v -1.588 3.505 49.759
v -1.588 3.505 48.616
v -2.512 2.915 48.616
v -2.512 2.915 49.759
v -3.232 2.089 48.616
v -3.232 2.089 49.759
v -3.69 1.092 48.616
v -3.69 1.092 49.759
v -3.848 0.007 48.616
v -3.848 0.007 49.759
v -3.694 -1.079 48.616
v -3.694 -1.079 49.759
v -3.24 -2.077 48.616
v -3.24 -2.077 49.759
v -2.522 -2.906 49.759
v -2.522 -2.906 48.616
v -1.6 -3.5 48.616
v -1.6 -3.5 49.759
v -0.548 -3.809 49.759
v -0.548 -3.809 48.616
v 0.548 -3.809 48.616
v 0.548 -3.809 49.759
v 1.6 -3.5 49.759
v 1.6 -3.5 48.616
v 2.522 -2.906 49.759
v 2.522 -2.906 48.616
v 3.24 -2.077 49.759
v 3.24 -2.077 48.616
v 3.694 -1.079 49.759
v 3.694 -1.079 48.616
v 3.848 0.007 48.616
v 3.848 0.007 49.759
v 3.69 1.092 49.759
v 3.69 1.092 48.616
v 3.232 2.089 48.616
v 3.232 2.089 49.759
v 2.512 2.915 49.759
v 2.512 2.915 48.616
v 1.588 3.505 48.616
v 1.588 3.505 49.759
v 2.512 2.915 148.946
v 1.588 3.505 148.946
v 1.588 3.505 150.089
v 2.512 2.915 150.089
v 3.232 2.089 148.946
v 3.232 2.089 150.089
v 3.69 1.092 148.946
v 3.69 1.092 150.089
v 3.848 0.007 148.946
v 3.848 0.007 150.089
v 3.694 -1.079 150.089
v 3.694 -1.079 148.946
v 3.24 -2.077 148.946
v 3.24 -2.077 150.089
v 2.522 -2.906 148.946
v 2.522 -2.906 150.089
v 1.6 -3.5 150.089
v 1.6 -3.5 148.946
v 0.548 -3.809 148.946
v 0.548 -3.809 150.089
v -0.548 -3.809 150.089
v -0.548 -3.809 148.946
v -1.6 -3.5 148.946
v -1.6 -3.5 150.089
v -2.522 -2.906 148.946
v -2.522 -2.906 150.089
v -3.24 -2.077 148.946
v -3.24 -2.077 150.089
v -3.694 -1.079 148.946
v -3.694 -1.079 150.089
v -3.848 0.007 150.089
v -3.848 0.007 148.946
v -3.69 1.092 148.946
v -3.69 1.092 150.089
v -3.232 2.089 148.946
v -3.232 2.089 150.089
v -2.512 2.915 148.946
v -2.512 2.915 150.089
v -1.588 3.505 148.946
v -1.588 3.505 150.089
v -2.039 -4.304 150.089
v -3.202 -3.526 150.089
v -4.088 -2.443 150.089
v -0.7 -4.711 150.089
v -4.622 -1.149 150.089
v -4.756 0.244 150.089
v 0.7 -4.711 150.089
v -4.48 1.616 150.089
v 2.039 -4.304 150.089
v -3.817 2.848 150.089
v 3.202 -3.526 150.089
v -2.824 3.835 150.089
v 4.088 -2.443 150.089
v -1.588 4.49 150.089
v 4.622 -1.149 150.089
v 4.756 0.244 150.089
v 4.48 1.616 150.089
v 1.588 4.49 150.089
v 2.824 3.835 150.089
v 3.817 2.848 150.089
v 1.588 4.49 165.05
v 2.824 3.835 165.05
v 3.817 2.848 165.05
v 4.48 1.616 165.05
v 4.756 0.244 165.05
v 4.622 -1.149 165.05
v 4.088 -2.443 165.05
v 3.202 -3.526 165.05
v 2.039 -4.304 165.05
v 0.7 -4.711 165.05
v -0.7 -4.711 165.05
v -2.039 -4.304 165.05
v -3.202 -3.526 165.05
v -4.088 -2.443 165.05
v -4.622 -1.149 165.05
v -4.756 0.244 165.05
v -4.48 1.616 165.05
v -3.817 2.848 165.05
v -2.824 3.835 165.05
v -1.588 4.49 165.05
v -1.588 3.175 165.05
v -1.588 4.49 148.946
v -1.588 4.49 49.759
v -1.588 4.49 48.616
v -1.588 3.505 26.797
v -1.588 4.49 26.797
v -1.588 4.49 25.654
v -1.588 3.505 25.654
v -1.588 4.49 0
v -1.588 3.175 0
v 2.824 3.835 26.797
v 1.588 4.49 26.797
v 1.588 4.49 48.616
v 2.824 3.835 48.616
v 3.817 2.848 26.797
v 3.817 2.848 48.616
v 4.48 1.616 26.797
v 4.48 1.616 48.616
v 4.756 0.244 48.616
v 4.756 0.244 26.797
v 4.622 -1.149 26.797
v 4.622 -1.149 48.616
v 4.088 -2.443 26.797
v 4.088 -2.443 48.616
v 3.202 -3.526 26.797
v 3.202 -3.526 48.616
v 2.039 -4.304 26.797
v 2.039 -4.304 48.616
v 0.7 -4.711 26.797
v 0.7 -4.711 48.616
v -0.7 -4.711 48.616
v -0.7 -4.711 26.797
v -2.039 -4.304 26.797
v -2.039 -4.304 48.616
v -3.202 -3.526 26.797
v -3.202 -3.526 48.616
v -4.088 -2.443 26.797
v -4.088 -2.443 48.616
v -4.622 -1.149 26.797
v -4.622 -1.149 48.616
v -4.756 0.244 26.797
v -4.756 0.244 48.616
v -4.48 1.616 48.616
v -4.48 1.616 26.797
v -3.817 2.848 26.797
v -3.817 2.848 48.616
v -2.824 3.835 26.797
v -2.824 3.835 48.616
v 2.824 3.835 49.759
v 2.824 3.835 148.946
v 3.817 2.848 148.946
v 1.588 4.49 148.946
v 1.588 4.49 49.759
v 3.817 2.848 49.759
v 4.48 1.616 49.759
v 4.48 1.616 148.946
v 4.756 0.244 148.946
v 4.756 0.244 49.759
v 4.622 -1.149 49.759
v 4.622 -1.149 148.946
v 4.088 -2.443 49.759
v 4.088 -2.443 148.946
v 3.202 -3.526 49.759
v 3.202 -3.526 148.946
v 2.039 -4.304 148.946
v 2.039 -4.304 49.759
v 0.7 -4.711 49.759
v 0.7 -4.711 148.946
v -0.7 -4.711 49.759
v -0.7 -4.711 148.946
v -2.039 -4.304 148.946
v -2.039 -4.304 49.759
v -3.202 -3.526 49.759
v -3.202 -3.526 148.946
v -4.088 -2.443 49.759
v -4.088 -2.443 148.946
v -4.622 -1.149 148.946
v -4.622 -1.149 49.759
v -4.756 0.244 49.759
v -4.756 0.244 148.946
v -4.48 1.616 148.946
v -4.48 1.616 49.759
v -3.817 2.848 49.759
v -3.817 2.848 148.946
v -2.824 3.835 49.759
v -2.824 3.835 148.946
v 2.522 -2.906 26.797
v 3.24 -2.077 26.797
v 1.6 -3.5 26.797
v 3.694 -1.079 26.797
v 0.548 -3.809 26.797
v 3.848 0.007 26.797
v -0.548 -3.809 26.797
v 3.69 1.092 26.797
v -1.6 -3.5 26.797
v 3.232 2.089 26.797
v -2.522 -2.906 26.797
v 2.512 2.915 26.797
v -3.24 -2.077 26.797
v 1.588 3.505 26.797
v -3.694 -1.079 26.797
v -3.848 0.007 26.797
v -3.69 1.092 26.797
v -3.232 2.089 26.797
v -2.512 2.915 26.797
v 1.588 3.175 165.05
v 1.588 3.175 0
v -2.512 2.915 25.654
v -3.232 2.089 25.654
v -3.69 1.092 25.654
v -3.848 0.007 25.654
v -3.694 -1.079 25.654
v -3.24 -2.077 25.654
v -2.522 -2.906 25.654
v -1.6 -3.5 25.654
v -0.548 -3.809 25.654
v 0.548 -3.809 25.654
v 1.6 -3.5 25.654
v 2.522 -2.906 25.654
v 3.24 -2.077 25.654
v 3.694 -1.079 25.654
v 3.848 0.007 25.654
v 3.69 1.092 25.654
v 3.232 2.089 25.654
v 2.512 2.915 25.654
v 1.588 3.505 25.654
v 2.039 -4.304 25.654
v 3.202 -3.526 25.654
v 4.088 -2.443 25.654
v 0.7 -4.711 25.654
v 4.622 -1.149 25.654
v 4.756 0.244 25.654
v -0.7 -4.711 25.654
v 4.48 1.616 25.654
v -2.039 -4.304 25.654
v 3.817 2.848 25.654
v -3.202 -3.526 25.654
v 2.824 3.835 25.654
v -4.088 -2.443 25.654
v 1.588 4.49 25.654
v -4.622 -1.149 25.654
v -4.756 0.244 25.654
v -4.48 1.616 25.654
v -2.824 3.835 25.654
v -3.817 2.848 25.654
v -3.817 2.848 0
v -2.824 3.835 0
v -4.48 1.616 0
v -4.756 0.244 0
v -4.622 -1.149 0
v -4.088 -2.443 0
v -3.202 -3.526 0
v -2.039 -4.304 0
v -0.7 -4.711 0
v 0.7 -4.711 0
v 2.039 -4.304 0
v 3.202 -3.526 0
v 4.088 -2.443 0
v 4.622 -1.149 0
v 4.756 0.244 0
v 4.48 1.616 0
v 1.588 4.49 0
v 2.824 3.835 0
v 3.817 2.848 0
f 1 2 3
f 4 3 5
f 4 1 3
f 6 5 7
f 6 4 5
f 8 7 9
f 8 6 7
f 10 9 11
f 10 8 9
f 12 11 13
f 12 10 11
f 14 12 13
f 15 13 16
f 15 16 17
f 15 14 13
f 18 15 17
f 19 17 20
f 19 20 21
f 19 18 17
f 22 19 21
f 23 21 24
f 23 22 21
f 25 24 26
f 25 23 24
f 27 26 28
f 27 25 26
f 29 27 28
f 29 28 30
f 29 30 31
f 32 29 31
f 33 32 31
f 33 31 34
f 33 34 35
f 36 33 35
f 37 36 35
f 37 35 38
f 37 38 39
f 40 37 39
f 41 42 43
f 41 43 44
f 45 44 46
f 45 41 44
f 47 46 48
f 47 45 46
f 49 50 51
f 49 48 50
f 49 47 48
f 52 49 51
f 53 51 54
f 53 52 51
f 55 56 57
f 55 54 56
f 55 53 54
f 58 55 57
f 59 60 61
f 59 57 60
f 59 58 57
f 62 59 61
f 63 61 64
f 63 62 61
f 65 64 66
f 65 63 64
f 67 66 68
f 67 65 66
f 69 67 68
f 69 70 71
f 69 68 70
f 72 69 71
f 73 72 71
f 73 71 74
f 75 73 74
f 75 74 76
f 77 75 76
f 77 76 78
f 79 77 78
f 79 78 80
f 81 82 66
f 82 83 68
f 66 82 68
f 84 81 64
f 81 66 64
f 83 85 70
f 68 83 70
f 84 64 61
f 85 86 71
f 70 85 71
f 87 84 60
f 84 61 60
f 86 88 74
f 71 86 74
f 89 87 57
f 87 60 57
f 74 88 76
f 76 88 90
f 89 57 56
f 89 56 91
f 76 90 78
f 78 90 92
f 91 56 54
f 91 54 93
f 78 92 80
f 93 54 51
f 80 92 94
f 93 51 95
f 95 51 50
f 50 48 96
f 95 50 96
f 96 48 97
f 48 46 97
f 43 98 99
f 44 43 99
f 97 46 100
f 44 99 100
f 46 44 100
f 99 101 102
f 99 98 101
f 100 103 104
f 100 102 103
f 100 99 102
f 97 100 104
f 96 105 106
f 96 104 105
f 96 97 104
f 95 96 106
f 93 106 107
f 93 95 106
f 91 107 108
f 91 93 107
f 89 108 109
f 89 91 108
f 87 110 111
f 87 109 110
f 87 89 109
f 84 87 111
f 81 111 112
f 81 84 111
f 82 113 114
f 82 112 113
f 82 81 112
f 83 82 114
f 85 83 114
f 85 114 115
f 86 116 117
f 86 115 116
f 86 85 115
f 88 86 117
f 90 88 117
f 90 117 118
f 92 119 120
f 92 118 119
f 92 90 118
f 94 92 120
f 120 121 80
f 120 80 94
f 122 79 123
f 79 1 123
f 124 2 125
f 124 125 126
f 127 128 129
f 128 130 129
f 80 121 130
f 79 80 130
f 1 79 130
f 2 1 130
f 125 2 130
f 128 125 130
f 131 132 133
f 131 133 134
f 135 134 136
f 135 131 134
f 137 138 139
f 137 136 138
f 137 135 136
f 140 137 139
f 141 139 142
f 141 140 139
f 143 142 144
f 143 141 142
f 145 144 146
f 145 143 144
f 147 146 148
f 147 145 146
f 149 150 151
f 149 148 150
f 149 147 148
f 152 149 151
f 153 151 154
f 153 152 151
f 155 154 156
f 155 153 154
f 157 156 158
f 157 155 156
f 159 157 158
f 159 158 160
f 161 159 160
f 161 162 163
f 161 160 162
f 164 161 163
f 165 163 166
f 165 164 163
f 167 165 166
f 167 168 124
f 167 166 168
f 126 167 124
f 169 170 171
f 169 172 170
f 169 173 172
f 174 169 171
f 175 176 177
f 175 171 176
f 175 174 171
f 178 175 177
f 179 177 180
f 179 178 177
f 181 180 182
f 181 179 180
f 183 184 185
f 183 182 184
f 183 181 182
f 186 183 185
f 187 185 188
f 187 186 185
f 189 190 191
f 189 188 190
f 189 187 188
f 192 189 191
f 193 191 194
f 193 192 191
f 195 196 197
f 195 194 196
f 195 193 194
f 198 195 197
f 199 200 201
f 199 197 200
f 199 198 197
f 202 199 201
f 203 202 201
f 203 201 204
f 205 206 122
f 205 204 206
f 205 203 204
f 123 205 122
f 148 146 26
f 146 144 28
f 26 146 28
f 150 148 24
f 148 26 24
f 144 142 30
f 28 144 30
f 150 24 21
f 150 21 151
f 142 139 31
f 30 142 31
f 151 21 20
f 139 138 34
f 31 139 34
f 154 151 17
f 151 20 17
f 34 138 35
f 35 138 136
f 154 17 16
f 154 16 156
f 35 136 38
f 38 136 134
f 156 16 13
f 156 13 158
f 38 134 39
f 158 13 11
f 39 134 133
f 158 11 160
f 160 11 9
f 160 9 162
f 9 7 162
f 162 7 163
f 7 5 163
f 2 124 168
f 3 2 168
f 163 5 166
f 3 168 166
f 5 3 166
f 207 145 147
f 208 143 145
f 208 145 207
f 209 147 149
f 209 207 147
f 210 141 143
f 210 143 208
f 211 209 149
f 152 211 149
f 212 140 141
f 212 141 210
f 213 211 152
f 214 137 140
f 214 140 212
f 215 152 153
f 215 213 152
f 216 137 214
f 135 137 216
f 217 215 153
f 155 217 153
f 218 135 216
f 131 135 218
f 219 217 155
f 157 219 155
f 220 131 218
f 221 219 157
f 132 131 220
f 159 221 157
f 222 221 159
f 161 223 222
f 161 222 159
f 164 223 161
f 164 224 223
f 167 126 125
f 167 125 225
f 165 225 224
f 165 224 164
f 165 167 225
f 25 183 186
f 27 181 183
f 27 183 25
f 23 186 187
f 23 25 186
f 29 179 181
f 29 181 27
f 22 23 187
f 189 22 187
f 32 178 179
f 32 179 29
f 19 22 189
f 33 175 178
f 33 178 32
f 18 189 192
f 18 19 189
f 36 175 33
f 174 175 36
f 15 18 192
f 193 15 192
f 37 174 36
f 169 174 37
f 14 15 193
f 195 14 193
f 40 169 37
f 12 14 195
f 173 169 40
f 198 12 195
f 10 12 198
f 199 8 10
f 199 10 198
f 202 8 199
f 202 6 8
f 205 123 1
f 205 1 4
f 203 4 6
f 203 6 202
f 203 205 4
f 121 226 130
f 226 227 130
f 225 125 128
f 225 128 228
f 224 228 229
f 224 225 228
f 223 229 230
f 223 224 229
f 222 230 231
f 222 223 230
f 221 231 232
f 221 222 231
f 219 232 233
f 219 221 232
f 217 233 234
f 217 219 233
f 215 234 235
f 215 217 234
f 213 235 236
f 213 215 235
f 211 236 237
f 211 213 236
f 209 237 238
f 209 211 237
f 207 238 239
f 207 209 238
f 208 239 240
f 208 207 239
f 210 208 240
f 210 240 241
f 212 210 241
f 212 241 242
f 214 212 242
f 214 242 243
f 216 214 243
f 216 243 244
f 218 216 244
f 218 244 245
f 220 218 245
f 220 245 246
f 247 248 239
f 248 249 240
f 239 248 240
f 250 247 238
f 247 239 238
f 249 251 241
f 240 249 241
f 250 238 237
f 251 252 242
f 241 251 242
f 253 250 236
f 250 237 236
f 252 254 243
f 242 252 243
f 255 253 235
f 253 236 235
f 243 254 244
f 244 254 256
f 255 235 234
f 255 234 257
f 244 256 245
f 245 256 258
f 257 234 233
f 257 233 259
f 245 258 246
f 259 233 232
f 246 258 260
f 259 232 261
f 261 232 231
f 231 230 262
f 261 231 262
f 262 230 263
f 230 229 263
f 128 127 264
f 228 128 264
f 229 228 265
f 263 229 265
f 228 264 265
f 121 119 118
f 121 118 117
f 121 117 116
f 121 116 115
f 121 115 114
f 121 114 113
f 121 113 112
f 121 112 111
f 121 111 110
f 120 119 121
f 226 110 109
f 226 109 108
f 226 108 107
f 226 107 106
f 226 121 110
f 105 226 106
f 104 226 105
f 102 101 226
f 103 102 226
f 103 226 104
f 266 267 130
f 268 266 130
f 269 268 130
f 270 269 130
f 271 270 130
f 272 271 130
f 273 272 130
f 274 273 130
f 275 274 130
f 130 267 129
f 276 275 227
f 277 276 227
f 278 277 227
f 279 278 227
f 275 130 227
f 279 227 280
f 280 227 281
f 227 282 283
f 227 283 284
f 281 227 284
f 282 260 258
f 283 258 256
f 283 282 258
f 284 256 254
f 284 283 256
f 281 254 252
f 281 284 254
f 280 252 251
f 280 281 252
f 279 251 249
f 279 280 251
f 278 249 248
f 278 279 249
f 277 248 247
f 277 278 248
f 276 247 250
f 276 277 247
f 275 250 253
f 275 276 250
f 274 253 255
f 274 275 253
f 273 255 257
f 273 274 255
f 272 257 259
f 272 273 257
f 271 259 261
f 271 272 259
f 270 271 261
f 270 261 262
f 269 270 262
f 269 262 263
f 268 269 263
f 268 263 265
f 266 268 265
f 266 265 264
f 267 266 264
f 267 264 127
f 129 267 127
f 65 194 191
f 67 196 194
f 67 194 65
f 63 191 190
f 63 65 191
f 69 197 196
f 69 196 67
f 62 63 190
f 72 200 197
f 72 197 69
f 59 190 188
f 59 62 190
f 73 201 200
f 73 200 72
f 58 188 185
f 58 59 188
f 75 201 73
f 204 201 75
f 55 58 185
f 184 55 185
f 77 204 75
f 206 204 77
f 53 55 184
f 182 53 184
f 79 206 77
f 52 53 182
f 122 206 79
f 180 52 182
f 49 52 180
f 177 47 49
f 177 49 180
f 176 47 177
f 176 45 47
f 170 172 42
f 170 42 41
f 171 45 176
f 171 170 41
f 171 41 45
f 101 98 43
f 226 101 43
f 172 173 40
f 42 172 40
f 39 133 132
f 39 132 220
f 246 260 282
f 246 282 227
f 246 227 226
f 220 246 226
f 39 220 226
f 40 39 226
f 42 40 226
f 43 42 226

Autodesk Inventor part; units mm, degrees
sketch "Sketch1" plane through (0, 0, 0) normal (0, 0, 1) x (1, 0, 0)
  circle A0 centre (0, 0) radius 4.7625
  line L0 (-1.5875, 6.35) -> (1.5875, 6.35)
  line L1 (1.5875, 6.35) -> (1.5875, 3.175)
  line L2 (1.5875, 3.175) -> (-1.5875, 3.175)
  line L3 (-1.5875, 3.175) -> (-1.5875, 6.35)
  dimension "d0" = 9.525
  dimension "d43" = 3.175
  dimension "d44" = 3.175
  dimension "d45" = 1.5875
  dimension "d46" = 6.35
extrude "Extrusion1" add sketch "Sketch1" along normal blind 165.05 contours A0 L3 L2 L1 | L1 L2 L3 A0
ref_plane "Work Plane6" through (0, 0, 176.4284) normal (0, 0, 1) x (1, 0, 0)
ref_plane "Work Plane12" through (0, 0, 148.9464) normal (0, 0, 1) x (1, 0, 0)
sketch "Sketch10" plane through (0, 0, 148.9464) normal (0, 0, 1) x (1, 0, 0)
  circle A0 centre (0, 0) radius 3.8481 projected
  circle A1 centre (0, 0) radius 4.7625 projected
extrude "Extrusion11" cut sketch "Sketch10" along normal blind 1.143
ref_plane "Work Plane13" through (0, 0, 49.7586) normal (0, 0, -1) x (-1, 0, 0)
sketch "Sketch11" plane through (0, 0, 49.7586) normal (0, 0, -1) x (-1, 0, 0)
  circle A0 centre (0, 0) radius 4.7625 projected
  circle A1 centre (0, 0) radius 3.8481 projected
  circle A2 centre (0, 0) radius 4.7625 projected
extrude "Extrusion12" cut sketch "Sketch11" along normal blind 1.143
ref_plane "Work Plane14" through (0, 0, 26.797) normal (0, 0, -1) x (-1, 0, 0)
sketch "Sketch12" plane through (0, 0, 26.797) normal (0, 0, -1) x (-1, 0, 0)
  circle A0 centre (0, 0) radius 3.8481 projected
  circle A1 centre (0, 0) radius 4.7625 projected
extrude "Extrusion13" cut sketch "Sketch12" along normal blind 1.143
ref_plane "Work Plane15" through (0, 0, 148.921) normal (0, 0, 1) x (1, 0, 0)
extrude "Extrusion14" cut sketch "Sketch1" along normal through all contours L1 L2 L3 A0 | A0 L3 L0 L1 picked at (-0.1794, 3.694)
equation "\"d44\" = d43"
equation "\"d45\" = 0.5 * d43"
equation "\"d46\" = 0.5 * d0 + 0.5 * d43"
properties part number "vertical drive shaft"
